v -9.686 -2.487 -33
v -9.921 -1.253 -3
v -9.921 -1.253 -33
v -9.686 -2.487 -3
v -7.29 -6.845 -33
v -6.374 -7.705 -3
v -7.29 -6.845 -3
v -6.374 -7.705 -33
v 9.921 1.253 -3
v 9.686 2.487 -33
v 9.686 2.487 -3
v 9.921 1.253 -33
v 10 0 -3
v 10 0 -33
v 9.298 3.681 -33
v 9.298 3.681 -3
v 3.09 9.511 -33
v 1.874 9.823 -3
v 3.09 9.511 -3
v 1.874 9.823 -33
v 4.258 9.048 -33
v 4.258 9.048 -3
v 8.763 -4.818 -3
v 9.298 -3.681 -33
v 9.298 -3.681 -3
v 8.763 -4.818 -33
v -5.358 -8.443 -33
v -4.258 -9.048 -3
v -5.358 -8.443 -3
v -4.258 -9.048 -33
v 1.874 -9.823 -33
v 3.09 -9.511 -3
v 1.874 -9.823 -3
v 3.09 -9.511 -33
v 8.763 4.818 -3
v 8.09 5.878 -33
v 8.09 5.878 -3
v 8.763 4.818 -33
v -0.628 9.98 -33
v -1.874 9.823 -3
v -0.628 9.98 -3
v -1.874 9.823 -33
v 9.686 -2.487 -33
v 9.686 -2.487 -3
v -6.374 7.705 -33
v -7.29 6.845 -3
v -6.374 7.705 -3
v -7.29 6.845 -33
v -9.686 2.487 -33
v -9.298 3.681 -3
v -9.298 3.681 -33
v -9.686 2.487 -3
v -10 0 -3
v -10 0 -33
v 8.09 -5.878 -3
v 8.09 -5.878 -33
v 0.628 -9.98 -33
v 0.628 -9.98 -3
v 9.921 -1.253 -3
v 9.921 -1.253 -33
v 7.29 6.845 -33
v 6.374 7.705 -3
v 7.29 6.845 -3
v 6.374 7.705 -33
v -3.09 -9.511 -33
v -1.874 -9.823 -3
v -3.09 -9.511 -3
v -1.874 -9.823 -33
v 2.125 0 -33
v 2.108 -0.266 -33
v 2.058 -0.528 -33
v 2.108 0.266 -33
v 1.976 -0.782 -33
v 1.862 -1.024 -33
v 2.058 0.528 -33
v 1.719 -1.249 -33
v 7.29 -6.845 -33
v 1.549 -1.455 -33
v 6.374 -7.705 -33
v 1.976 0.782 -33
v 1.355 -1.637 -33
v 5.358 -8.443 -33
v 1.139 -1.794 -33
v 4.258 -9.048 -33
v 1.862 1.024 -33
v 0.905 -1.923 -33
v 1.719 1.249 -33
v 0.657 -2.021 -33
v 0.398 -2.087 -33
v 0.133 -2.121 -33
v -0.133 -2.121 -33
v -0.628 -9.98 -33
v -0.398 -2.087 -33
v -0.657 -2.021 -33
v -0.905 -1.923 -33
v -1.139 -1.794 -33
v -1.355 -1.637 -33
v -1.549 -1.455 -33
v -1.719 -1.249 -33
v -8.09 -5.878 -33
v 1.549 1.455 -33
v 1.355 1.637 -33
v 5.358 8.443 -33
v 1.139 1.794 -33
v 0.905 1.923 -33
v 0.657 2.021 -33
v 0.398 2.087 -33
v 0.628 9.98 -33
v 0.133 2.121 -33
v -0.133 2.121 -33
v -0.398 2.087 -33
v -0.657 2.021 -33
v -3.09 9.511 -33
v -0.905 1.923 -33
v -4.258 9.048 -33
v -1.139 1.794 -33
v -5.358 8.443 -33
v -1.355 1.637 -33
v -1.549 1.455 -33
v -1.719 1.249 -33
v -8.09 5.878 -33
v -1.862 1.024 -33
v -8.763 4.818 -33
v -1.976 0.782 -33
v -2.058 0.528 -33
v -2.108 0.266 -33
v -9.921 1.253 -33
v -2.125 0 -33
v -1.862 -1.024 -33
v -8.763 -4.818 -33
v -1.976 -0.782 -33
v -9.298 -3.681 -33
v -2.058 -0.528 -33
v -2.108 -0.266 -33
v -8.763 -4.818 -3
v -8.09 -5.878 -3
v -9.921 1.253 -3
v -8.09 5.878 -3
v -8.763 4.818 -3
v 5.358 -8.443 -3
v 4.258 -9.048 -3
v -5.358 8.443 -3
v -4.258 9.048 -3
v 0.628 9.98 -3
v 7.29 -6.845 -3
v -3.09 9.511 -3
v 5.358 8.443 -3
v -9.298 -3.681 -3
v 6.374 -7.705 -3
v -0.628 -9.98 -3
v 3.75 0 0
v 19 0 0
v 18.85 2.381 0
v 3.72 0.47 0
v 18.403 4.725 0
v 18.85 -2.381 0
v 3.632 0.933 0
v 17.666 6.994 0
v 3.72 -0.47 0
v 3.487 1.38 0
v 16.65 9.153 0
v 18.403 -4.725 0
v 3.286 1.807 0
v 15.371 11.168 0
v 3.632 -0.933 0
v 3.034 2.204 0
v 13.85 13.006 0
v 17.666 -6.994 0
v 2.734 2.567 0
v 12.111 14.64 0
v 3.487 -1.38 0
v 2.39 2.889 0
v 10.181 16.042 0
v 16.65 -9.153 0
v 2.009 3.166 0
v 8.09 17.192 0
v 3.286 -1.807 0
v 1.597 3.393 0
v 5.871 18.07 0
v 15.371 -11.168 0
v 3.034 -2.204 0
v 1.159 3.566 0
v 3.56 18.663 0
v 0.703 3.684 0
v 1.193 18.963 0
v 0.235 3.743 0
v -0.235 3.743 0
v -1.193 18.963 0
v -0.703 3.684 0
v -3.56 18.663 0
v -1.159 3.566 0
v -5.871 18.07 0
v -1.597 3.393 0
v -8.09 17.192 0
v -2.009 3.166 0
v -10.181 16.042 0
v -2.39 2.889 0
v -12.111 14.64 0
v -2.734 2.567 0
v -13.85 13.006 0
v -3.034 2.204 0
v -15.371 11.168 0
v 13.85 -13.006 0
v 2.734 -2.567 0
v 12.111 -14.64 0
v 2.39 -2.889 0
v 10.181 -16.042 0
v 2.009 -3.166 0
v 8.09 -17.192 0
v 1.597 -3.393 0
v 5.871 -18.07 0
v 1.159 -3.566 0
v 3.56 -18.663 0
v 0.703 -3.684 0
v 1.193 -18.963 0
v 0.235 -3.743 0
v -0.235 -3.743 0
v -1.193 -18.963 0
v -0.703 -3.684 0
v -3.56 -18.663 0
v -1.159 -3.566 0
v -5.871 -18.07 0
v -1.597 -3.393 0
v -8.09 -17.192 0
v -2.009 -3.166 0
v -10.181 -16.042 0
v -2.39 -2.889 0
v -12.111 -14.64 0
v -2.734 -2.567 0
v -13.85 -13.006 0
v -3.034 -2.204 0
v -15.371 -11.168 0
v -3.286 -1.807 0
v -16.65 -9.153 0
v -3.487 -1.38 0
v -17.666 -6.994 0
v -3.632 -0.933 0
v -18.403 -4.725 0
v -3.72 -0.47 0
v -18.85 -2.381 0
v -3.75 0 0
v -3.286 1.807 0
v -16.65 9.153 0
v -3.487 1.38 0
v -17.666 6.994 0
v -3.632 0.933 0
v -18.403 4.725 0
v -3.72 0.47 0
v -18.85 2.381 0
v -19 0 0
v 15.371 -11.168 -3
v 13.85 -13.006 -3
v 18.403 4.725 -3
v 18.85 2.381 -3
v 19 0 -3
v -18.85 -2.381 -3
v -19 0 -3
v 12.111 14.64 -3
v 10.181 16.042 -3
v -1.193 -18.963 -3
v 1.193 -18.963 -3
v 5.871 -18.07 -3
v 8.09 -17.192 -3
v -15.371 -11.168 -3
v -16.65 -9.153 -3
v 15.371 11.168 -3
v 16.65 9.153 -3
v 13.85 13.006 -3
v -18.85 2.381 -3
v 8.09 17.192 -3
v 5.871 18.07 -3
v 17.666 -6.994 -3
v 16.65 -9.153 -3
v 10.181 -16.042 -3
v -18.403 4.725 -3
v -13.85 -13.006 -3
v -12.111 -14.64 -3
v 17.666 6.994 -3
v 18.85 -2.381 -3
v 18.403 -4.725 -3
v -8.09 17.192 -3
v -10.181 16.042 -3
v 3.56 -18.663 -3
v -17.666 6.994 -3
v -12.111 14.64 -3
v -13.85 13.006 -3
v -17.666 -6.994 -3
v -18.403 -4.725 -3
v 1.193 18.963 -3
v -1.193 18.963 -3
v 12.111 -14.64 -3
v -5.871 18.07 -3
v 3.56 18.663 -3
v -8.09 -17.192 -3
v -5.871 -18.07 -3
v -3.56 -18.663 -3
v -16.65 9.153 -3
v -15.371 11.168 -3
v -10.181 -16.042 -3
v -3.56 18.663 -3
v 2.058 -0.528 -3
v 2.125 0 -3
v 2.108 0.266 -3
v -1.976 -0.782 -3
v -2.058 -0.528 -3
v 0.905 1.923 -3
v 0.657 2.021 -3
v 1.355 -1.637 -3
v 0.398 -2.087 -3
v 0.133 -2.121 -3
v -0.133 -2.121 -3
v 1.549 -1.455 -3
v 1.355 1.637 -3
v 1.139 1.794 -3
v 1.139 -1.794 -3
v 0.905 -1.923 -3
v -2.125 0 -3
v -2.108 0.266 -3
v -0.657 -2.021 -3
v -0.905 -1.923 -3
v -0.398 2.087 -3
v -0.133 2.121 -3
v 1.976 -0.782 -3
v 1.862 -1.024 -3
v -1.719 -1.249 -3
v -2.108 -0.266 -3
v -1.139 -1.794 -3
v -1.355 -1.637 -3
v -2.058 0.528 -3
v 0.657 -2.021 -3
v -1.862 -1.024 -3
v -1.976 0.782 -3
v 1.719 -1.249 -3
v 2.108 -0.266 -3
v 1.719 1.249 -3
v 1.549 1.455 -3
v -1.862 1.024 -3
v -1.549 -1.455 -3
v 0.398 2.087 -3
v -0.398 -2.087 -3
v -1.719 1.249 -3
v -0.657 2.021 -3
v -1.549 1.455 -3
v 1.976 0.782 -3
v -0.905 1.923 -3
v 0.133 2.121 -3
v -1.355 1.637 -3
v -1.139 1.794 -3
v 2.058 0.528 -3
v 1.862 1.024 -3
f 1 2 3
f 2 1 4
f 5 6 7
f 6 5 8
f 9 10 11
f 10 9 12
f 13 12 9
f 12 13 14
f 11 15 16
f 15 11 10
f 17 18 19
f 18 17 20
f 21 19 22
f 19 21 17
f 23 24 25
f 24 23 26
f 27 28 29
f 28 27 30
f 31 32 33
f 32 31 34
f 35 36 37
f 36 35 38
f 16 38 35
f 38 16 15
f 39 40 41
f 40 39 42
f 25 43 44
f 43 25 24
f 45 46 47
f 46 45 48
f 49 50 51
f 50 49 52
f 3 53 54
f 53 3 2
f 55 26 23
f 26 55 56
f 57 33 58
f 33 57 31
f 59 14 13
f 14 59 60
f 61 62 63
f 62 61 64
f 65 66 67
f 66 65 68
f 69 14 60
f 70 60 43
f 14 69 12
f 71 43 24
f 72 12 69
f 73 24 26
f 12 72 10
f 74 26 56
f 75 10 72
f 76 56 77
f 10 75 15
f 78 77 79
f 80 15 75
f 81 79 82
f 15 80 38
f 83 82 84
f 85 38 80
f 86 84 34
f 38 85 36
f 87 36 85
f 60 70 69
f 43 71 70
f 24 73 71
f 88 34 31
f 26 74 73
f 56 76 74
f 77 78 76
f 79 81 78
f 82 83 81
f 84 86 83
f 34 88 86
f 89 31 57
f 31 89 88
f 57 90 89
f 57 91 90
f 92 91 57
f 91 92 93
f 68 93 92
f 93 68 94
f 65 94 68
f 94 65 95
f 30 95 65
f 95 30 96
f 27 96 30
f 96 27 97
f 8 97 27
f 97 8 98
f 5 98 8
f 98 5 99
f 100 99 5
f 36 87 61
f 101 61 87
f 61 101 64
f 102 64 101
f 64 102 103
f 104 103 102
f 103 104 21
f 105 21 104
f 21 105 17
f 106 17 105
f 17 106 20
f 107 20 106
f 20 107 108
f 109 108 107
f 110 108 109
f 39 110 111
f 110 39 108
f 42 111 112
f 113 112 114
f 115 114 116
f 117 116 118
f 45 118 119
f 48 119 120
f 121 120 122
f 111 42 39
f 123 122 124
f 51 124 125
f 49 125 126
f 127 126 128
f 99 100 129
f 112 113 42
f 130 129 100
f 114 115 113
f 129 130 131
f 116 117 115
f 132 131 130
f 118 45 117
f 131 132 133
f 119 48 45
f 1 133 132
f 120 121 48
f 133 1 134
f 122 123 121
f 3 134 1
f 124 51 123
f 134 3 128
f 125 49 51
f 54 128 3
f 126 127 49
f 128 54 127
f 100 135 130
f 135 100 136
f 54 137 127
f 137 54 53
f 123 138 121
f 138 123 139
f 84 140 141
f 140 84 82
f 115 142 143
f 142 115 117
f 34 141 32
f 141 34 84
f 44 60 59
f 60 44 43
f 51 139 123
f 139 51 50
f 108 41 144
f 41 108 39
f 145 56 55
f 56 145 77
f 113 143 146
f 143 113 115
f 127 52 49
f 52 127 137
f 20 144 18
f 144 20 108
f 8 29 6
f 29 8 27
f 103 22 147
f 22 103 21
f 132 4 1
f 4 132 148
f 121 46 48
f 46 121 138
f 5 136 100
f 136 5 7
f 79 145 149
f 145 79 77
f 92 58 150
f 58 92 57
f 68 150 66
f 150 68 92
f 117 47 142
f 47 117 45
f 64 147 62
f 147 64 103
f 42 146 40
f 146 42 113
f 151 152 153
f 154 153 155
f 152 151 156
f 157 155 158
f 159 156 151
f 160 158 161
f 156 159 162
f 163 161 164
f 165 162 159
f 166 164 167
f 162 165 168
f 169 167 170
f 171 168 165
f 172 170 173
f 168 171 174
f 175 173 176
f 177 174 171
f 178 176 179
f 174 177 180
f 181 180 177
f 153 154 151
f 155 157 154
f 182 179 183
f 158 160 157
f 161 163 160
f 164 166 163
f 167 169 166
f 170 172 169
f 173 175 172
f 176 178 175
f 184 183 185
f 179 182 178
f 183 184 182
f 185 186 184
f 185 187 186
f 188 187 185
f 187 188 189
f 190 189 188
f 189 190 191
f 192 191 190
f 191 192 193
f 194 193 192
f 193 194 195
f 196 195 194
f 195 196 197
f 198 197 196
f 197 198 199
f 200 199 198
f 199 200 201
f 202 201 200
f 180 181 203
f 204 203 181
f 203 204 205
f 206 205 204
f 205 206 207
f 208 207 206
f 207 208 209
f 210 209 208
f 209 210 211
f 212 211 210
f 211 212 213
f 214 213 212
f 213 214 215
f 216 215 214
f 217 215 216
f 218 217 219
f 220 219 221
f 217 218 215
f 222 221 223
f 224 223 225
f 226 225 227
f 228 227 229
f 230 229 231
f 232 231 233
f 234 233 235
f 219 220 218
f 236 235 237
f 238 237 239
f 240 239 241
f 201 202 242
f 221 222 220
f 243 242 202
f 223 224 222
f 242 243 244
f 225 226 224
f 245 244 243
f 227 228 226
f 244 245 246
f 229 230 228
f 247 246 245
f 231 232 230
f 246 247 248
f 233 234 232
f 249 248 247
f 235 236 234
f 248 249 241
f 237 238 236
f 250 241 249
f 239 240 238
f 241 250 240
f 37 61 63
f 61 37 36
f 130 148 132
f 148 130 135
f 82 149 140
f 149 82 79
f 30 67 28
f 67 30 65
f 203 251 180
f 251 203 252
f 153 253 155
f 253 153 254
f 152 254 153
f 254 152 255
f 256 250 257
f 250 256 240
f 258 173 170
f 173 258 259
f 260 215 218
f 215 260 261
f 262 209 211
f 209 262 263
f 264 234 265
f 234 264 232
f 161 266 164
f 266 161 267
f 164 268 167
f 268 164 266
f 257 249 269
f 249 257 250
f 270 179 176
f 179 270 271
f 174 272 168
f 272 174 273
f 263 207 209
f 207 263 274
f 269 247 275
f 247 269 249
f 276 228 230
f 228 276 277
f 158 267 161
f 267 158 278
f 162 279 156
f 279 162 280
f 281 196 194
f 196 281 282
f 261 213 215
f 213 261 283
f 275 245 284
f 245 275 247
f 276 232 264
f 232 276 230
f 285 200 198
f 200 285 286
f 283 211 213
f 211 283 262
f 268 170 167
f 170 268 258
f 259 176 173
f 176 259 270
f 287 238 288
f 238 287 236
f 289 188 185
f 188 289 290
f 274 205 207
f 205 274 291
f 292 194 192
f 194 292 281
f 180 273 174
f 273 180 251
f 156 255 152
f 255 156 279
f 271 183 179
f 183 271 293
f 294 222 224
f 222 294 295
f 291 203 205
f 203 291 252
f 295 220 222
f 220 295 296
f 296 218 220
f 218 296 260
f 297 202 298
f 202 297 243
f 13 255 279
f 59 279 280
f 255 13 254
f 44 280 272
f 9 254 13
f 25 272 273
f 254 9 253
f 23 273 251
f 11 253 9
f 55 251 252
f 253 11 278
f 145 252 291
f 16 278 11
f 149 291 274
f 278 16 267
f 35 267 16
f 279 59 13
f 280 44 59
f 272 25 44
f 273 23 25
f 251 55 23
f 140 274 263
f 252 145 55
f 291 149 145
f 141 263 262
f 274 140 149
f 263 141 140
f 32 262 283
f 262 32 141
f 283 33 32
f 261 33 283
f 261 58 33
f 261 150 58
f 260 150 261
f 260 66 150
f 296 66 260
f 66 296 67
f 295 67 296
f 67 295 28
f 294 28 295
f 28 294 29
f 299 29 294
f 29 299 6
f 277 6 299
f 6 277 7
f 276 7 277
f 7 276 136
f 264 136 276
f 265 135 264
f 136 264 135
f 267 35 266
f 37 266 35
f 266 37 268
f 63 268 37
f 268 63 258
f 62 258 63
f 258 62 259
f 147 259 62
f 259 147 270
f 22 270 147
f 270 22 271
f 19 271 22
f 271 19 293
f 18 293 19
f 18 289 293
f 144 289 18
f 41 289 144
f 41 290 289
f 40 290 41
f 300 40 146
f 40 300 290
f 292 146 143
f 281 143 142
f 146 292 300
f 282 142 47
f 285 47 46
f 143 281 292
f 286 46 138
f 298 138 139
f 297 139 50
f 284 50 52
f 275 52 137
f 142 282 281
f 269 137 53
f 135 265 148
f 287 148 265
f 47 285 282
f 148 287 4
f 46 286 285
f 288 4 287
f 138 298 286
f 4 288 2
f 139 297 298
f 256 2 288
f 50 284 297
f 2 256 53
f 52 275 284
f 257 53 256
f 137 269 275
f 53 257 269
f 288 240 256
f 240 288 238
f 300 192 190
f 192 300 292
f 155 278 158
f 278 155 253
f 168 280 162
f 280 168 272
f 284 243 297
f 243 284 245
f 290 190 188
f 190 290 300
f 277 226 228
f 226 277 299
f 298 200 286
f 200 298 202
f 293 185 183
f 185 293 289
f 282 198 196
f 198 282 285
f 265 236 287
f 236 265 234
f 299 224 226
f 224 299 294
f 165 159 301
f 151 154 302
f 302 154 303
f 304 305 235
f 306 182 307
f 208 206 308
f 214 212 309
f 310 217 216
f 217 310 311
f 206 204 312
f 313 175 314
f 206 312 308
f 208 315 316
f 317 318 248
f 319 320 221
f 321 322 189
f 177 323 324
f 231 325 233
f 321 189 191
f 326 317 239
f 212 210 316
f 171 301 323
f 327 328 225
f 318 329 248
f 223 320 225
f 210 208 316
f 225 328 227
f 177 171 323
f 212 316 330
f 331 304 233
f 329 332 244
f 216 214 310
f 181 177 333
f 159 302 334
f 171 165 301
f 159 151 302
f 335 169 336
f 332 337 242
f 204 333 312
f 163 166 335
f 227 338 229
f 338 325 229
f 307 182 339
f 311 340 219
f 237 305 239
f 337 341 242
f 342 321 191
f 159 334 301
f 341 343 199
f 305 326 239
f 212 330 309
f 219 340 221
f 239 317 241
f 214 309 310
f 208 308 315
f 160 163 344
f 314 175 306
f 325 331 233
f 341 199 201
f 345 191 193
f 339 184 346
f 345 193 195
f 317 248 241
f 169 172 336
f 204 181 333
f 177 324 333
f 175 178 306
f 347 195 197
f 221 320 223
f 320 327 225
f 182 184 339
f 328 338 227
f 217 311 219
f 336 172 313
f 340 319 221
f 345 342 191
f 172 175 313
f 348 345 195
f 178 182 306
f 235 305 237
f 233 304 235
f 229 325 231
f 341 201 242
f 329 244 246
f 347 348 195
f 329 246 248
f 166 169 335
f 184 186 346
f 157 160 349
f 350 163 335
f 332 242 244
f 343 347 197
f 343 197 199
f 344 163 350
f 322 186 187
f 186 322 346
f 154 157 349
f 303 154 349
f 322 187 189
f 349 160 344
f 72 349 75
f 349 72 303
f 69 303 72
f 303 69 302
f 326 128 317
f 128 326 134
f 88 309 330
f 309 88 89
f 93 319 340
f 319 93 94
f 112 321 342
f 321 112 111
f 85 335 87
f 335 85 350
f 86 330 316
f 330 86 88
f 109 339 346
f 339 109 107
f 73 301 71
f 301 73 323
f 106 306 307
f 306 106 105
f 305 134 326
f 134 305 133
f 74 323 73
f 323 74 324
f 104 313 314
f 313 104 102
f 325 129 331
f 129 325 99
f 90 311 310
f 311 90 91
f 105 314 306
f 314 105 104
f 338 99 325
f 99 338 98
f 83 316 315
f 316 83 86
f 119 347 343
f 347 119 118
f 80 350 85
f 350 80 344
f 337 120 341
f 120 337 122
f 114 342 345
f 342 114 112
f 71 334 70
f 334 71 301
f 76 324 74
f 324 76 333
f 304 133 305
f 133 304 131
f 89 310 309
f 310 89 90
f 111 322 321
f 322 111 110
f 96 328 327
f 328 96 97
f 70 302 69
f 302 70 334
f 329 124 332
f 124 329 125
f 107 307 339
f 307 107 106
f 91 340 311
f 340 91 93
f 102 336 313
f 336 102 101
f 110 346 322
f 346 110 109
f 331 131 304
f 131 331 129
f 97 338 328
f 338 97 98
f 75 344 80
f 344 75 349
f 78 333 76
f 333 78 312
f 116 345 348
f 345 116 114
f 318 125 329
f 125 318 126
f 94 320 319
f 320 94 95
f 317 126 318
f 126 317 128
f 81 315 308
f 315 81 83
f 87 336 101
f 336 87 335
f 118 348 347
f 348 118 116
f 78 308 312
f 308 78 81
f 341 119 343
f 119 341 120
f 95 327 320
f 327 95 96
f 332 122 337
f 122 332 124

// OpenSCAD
$fn = 50;


difference() {
	union() {
		translate(v = [0, 0, -33.0000000000]) {
			cylinder(h = 33, r = 10.0000000000);
		}
		translate(v = [0, 0, -3.0000000000]) {
			cylinder(h = 3, r = 19.0000000000);
		}
	}
	union() {
		translate(v = [0, 0, 0]) {
			rotate(a = [0, 0, 0]) {
				difference() {
					union() {
						#translate(v = [0, 0, -33.0000000000]) {
							cylinder(h = 33, r = 2.0000000000);
						}
						#translate(v = [0, 0, -3]) {
							cylinder(h = 3, r1 = 2.1250000000, r2 = 3.7500000000);
						}
						#translate(v = [0, 0, -33.0000000000]) {
							cylinder(h = 33, r = 2.1250000000);
						}
						#translate(v = [0, 0, -33.0000000000]) {
							cylinder(h = 33, r = 2.0000000000);
						}
					}
					union();
				}
			}
		}
	}
}
